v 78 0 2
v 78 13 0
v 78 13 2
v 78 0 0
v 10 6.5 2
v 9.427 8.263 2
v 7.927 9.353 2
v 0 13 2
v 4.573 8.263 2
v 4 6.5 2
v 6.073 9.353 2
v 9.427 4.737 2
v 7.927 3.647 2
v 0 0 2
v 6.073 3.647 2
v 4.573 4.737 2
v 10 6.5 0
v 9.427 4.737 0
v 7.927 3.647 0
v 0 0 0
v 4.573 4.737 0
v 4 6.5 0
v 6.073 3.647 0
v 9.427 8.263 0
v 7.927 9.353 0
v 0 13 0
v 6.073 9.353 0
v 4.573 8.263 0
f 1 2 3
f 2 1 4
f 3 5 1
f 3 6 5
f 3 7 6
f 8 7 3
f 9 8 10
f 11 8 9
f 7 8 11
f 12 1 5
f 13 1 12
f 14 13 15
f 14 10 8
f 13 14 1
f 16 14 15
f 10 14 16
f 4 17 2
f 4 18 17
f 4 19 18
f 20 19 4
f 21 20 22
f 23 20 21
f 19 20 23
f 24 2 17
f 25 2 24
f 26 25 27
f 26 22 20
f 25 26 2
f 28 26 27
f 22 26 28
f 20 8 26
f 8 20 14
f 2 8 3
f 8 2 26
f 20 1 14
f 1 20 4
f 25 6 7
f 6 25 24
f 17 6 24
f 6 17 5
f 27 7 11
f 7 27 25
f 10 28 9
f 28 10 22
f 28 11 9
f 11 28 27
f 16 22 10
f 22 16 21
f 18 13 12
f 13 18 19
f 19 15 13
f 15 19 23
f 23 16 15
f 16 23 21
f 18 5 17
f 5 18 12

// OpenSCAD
LENGTH = 78;
WIDTH = 13;
HEIGHT = 2;
MOUNTING_HOLE_DIAMETER = 6;

// TODO: Round corners

difference(){
    cube([LENGTH, WIDTH, HEIGHT]);
    
    // Mounting hole
    translate([(MOUNTING_HOLE_DIAMETER/2)+4, (WIDTH/2),0]){
        cylinder(r=MOUNTING_HOLE_DIAMETER/2, h=HEIGHT);
    }
    
    // TODO: Cutter scallops
}
